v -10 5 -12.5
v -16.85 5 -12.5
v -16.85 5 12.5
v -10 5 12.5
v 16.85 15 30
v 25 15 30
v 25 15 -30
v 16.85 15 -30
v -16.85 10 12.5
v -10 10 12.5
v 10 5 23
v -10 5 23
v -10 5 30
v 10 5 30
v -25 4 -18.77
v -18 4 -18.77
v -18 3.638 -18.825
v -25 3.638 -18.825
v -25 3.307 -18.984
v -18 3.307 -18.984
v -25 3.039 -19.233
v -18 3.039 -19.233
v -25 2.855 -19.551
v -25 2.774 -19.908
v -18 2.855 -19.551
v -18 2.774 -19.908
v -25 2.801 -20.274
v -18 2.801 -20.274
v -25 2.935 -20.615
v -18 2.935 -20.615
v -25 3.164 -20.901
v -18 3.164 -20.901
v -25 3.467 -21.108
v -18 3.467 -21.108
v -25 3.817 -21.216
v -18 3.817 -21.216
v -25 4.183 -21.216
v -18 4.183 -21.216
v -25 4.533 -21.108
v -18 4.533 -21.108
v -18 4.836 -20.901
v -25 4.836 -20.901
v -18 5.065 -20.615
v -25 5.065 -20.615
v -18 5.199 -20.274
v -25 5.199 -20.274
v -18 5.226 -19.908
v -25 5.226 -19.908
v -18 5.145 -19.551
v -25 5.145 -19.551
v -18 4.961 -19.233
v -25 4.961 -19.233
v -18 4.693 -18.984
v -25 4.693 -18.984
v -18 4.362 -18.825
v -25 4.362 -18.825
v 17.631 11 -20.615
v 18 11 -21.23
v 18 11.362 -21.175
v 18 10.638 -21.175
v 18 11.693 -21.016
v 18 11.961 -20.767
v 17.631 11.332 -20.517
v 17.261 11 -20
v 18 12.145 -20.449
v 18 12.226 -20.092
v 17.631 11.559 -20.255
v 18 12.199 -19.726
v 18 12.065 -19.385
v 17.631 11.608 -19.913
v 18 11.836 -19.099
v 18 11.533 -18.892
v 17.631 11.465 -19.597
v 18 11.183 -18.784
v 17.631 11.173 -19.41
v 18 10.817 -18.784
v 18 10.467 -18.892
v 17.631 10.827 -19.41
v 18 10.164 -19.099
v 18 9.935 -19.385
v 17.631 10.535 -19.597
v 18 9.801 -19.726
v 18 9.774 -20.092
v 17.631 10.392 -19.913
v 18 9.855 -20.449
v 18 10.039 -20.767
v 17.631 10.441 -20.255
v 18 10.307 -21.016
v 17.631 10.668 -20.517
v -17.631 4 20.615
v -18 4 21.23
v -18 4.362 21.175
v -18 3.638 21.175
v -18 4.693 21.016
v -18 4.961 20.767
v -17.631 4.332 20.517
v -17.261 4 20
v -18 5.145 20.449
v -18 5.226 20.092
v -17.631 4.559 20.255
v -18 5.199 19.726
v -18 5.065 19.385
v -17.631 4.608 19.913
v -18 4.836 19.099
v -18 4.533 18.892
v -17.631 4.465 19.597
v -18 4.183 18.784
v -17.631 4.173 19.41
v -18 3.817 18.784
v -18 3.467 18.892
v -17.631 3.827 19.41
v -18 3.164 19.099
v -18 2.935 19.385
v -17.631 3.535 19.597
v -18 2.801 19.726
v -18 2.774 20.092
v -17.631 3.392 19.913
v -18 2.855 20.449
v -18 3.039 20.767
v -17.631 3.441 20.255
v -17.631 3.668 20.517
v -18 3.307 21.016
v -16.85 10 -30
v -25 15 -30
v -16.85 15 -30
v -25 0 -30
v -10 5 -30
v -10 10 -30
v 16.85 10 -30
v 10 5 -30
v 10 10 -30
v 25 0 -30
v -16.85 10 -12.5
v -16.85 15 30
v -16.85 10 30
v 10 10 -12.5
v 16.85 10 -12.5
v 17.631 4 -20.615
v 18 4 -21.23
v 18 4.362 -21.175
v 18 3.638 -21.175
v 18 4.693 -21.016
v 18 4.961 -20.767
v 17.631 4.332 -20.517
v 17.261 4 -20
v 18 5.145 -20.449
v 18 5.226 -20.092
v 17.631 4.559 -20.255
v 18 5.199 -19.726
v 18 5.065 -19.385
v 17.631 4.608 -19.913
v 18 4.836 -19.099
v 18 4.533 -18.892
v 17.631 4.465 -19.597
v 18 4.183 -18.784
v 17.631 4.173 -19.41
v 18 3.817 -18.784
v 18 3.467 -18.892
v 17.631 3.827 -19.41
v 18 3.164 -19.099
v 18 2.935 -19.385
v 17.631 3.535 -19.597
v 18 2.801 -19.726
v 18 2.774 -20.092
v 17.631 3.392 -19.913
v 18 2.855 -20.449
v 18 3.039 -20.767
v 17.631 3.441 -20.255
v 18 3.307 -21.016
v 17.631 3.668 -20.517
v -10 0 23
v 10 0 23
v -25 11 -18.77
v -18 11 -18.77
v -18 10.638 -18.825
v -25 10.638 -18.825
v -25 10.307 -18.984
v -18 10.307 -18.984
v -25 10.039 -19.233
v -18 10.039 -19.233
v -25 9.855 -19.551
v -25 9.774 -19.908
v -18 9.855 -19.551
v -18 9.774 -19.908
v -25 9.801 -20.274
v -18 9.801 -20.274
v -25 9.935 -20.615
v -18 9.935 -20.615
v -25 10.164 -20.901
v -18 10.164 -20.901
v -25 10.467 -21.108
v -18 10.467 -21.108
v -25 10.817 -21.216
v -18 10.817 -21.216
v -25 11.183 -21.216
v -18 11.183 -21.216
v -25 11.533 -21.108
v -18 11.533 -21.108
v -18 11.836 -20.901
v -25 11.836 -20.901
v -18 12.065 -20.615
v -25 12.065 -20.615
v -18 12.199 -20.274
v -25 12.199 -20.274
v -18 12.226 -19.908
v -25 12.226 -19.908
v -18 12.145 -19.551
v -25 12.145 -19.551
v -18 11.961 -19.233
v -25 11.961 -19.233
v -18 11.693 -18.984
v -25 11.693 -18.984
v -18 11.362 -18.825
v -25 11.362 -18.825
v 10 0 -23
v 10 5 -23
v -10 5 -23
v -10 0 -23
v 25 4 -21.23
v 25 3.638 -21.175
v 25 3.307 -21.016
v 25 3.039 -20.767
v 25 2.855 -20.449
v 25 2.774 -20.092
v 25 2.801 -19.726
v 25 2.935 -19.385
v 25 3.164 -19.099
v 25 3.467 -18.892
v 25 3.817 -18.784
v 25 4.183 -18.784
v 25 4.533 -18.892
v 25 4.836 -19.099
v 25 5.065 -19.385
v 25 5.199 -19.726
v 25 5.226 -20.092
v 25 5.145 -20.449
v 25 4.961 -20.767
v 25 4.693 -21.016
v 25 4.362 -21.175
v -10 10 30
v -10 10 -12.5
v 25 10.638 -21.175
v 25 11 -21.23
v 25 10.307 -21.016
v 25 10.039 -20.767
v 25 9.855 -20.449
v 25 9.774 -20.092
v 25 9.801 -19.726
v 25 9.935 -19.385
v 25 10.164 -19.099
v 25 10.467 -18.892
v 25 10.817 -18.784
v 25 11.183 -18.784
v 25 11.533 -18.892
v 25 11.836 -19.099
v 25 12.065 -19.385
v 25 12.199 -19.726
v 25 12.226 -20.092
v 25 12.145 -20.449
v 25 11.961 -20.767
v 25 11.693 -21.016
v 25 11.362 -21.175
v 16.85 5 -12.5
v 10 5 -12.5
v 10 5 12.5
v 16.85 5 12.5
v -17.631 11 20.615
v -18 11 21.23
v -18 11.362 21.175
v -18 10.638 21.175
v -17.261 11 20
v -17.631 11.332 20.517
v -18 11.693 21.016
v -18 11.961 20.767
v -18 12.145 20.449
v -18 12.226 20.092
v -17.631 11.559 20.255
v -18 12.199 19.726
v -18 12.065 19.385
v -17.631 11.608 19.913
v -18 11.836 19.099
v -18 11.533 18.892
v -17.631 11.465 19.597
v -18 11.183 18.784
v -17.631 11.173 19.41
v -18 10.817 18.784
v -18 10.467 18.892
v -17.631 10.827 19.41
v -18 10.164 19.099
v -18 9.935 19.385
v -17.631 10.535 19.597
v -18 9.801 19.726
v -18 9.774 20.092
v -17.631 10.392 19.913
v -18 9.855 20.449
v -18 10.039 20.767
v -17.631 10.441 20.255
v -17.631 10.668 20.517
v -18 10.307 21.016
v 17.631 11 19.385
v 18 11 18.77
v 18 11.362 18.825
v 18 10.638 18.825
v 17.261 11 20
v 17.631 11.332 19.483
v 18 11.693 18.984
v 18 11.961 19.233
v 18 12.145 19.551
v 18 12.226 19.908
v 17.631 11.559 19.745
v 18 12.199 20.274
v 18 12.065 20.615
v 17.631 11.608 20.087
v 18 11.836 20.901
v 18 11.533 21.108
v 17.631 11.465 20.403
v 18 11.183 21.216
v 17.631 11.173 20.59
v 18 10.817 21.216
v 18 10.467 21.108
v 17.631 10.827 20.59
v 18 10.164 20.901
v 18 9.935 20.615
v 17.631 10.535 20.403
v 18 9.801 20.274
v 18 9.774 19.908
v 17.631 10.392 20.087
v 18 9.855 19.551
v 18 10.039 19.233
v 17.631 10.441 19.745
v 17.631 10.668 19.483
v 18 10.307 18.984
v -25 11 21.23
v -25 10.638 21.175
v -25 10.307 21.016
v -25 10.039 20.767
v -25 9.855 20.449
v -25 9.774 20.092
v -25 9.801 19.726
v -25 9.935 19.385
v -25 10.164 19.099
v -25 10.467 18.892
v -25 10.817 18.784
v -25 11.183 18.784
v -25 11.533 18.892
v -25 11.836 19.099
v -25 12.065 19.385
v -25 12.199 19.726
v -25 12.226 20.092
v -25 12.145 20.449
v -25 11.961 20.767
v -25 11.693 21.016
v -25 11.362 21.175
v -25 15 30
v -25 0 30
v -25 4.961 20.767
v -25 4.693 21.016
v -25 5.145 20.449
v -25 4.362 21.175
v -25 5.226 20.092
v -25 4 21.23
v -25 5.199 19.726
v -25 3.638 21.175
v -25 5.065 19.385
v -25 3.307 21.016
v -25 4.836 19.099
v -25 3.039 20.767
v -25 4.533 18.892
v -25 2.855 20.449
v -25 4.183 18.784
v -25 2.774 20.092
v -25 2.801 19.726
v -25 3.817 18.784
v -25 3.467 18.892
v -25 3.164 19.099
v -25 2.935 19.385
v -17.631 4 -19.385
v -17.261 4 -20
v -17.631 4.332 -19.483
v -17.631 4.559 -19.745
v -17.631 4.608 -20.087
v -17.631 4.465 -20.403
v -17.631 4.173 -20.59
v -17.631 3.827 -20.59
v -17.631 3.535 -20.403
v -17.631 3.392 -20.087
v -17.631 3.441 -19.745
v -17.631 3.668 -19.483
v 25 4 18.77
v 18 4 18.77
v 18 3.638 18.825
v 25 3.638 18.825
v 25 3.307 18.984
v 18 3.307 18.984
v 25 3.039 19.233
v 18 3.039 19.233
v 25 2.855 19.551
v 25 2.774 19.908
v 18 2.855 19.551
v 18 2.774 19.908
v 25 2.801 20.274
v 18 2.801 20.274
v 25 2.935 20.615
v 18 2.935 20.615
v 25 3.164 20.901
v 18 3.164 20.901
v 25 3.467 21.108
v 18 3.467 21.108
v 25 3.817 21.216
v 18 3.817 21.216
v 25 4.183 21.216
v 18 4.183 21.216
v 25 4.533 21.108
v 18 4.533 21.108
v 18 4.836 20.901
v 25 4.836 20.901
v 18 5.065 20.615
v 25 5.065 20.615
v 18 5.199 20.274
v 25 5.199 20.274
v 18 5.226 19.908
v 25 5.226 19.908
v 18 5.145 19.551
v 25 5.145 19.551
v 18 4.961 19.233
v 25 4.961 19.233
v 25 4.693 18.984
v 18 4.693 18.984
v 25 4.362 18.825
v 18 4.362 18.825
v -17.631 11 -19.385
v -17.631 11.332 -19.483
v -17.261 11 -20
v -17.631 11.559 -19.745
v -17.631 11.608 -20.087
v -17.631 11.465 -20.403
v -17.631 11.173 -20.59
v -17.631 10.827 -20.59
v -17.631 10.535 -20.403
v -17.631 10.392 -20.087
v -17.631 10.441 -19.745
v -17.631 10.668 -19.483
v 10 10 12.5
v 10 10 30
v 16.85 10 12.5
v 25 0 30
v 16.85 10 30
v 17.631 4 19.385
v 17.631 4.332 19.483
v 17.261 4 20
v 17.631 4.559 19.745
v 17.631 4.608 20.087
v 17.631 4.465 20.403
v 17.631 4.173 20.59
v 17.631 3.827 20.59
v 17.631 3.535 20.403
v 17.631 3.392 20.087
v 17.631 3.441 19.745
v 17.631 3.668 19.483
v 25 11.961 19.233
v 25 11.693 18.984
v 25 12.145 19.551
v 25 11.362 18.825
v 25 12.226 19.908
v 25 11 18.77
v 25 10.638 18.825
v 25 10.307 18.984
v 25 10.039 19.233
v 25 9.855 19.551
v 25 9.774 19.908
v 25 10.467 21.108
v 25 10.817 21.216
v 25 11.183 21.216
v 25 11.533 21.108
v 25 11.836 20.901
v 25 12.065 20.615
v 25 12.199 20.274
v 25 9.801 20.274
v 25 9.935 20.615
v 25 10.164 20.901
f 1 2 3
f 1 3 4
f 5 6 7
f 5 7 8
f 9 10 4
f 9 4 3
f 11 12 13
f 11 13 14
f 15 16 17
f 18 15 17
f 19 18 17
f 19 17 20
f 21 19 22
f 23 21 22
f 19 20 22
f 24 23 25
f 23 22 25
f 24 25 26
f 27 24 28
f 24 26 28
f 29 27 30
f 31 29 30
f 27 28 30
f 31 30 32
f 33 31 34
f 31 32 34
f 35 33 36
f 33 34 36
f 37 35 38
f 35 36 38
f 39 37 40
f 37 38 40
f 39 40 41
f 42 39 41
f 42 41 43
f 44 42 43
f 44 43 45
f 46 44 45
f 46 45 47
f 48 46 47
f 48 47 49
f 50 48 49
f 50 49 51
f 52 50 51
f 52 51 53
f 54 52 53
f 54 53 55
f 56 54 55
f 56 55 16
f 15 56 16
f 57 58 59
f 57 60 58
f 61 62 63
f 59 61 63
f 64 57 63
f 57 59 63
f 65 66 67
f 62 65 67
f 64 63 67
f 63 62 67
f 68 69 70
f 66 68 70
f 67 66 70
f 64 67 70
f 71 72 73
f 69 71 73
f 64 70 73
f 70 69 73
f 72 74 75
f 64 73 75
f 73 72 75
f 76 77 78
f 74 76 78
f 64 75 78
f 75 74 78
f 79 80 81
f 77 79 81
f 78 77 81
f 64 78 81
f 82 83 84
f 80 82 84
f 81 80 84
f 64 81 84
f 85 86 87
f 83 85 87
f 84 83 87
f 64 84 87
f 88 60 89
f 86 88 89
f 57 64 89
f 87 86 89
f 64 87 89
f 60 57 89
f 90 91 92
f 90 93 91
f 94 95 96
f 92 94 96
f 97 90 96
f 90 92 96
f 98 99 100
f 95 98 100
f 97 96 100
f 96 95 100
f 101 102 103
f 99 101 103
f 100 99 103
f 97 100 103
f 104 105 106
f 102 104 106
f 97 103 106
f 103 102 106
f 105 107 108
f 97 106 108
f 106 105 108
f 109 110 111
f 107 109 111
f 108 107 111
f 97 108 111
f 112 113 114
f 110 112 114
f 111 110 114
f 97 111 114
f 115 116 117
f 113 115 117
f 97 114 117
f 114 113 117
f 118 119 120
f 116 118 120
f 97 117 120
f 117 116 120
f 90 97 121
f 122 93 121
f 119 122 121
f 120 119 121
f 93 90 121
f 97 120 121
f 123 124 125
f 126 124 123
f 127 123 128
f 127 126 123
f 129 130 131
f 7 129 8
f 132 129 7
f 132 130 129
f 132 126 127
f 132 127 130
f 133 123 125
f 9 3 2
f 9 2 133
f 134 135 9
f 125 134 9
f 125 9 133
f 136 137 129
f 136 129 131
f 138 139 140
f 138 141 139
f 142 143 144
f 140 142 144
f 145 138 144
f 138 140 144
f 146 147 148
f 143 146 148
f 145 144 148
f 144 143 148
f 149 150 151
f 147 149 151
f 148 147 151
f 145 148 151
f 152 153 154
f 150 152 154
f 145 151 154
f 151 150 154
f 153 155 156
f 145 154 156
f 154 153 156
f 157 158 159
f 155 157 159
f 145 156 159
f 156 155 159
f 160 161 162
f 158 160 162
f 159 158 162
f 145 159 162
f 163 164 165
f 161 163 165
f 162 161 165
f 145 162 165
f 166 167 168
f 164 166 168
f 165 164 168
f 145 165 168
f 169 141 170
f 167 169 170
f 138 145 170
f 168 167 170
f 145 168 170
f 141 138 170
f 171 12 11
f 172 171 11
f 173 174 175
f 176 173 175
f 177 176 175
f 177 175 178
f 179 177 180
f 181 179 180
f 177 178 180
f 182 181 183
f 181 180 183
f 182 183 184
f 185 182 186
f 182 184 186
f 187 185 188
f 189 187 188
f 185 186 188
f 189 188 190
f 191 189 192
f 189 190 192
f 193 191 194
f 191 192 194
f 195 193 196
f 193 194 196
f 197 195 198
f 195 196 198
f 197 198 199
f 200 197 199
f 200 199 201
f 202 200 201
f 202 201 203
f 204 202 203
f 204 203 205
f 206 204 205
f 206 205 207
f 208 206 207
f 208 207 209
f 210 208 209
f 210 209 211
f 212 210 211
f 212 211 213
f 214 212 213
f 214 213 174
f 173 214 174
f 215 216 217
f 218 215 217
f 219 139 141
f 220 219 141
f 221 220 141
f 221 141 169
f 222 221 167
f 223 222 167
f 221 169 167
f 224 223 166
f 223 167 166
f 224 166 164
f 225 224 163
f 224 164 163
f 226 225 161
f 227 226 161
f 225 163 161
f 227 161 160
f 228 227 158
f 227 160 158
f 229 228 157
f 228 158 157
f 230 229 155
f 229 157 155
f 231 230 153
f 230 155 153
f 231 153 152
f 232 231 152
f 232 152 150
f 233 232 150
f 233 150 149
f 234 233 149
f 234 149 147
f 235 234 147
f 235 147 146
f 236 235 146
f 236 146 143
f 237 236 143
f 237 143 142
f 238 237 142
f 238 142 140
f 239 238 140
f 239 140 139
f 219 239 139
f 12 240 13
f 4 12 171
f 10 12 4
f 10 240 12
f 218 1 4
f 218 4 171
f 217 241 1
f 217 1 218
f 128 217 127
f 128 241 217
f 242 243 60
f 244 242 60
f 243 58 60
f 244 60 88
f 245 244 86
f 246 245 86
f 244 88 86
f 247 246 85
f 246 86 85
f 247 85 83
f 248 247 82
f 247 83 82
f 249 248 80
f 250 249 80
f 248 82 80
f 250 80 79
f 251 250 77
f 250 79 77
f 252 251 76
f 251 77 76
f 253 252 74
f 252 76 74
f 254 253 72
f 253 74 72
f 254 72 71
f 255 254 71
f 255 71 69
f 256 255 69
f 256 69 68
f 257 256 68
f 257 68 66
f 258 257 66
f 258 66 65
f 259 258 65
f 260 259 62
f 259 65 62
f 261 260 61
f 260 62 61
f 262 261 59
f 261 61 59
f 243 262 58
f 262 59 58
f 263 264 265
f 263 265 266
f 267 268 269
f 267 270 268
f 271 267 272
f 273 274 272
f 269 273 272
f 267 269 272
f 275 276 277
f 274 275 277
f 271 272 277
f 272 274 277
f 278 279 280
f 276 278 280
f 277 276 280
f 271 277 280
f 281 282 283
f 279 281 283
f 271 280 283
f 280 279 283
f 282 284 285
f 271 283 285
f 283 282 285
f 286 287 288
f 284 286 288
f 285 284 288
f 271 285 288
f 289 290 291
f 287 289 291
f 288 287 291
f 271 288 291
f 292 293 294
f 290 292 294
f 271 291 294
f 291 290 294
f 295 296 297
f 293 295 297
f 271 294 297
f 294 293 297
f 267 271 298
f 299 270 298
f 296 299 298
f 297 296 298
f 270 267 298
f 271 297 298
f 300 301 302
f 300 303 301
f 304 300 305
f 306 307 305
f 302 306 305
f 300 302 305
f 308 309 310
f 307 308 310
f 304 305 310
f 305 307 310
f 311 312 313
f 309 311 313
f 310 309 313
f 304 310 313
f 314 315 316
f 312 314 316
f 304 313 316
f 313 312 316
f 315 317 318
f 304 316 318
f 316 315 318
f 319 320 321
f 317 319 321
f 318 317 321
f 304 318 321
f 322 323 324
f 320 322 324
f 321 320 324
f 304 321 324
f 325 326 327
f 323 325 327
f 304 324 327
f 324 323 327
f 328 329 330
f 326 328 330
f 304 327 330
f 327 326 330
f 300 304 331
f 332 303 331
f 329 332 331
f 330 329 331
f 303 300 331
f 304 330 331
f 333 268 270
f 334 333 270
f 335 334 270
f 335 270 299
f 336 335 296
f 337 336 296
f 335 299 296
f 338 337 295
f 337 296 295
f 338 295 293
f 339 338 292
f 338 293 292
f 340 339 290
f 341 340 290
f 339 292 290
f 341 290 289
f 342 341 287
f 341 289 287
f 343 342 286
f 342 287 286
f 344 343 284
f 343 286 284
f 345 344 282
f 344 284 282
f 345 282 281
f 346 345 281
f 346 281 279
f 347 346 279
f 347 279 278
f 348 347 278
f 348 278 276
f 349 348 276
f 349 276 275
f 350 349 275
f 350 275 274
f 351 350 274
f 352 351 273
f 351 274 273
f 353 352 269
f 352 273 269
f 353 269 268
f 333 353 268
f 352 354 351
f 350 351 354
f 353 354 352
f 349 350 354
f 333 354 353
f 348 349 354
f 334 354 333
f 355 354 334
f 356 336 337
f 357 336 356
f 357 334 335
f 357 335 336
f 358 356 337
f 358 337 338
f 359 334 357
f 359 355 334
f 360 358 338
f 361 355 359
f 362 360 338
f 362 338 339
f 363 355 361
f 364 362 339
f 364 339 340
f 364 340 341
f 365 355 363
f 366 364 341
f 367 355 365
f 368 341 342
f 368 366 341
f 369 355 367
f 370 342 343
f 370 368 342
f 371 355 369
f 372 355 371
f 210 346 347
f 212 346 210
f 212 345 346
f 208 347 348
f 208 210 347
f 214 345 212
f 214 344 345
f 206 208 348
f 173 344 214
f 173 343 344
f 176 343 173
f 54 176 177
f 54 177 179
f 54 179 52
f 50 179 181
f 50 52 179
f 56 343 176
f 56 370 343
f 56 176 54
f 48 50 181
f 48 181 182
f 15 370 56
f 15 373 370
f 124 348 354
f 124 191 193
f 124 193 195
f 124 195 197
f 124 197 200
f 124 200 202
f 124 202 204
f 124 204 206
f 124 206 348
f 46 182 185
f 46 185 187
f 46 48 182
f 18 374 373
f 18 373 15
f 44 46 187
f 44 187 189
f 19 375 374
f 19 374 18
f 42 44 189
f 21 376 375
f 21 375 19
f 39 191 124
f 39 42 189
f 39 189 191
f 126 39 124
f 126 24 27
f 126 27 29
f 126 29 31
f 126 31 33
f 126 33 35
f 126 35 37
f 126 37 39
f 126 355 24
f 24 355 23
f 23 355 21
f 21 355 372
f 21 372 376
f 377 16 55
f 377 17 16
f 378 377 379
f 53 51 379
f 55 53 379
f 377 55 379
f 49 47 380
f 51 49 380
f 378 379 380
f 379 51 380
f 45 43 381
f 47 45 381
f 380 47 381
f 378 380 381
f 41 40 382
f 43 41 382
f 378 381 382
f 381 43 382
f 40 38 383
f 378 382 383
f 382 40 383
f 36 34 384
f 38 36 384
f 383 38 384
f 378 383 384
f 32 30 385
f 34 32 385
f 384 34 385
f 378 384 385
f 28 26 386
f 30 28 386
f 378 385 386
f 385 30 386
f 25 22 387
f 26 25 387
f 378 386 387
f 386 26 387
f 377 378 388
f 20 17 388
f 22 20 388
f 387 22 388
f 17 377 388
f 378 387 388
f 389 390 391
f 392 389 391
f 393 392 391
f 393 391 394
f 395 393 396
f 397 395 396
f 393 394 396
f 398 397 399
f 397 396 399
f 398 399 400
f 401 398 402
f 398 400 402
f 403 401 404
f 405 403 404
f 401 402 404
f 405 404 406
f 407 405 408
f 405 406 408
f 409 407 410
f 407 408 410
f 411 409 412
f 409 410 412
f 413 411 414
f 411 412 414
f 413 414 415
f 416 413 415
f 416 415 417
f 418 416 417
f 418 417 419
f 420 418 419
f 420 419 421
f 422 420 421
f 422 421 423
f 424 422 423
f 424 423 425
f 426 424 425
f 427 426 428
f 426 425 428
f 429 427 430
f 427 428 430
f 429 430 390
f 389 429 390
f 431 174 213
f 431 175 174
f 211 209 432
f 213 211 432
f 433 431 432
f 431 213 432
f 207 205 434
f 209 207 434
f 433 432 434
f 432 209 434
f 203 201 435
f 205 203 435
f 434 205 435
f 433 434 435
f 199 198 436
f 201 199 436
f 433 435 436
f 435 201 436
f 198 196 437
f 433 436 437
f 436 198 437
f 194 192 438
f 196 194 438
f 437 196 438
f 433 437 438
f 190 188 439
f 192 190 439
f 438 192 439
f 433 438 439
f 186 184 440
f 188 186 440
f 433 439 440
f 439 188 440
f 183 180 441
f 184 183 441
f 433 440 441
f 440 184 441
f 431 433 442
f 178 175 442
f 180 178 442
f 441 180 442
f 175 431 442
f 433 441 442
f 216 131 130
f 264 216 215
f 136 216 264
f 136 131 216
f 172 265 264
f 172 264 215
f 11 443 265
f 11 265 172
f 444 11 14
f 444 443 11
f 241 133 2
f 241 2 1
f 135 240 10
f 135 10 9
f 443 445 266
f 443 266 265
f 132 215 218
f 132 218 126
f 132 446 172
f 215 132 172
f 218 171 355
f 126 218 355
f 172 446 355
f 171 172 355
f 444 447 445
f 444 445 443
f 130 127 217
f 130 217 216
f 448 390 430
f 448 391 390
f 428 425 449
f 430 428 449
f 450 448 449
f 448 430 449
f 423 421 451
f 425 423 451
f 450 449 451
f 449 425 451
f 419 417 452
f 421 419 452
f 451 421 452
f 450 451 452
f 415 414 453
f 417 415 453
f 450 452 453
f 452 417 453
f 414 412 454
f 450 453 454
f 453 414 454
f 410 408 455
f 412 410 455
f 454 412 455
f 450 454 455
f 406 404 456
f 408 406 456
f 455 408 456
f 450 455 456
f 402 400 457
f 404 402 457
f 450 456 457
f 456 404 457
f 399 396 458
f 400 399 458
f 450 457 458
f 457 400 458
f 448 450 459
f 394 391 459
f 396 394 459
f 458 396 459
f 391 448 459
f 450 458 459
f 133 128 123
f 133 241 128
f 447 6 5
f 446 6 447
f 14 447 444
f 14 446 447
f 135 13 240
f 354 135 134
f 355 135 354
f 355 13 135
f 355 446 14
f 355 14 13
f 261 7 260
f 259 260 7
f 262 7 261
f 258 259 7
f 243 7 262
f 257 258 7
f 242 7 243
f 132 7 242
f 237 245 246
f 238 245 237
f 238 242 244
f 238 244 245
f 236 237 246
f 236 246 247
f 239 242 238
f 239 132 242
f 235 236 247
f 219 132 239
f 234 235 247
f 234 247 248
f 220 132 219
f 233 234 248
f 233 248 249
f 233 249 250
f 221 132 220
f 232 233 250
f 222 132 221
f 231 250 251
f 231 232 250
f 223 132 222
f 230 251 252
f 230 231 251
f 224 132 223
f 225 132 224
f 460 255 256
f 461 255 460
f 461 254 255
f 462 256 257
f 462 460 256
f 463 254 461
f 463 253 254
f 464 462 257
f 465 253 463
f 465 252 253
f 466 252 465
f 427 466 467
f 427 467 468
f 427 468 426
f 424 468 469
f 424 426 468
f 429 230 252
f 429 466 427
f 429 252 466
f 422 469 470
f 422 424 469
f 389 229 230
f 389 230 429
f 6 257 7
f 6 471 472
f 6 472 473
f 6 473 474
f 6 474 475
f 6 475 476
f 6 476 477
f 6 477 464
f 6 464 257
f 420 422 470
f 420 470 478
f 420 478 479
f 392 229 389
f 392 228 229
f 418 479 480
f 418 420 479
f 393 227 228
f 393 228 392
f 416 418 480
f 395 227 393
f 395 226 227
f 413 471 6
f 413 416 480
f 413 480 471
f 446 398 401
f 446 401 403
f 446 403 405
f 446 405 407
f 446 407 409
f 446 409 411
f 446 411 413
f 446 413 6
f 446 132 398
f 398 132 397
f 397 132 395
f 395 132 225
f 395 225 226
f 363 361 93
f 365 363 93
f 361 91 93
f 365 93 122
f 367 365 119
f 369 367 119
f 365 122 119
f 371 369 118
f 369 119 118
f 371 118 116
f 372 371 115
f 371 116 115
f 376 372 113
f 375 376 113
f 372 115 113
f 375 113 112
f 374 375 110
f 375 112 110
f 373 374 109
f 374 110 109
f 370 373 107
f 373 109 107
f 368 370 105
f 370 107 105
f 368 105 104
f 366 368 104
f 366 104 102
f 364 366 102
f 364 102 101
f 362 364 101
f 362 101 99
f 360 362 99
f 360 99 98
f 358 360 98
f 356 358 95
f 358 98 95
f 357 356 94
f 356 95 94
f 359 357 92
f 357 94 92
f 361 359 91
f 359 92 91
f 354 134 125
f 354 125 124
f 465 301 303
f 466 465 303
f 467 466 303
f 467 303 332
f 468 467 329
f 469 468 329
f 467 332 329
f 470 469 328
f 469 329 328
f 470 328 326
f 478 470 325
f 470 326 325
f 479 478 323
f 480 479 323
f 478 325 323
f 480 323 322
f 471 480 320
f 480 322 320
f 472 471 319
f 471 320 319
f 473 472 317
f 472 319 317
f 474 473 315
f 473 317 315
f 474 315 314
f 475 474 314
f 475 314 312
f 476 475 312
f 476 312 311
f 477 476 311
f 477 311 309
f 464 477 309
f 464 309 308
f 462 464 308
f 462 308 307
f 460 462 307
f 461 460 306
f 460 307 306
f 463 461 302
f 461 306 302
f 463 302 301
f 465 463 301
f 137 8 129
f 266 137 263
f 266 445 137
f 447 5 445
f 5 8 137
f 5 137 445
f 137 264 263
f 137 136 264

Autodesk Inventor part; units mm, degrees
ref_plane "YZ Plane" through (0, 0, 0) normal (1, 0, 0) x (0, 1, 0)
ref_plane "XZ Plane" through (0, 0, 0) normal (0, 1, 0) x (-1, 0, 0)
ref_plane "XY Plane" through (0, 0, 0) normal (0, 0, 1) x (1, 0, 0)
sketch "Sketch1" plane through (0, 0, 0) normal (0, 1, 0) x (-1, 0, 0)
  line L0 (25, -30) -> (-25, -30)
  line L1 (-25, -30) -> (-25, 30)
  line L2 (-25, 30) -> (25, 30)
  line L3 (25, 30) -> (25, -30)
  point P0 (0, 0)
  dimension "d0" = 50
  dimension "d1" = 60
  dimension "d8" = 30
  dimension "d9" = 25
extrude "Extrusion1" add sketch "Sketch1" along normal blind 15
sketch "Sketch2" plane through (0, 15, 0) normal (0, 1, 0) x (1, 0, 0)
  line L0 (-16.85, 12.5) -> (16.85, 12.5)
  line L1 (16.85, 12.5) -> (16.85, -12.5)
  line L2 (16.85, -12.5) -> (-16.85, -12.5)
  line L3 (-16.85, -12.5) -> (-16.85, 12.5)
  point P0 (0, 0)
  dimension "d4" = 33.7
  dimension "d5" = 25
  dimension "d6" = 12.5
  dimension "d7" = 16.85
extrude "Extrusion2" cut sketch "Sketch2" against normal blind 10
sketch "Sketch3" plane through (0, 15, 0) normal (0, 1, 0) x (1, 0, 0)
  line L0 (-25, 30) -> (25, 30) projected
  line L1 (-25, -30) -> (25, -30) projected
  line L2 (-10, 30) -> (10, 30)
  line L3 (10, 30) -> (10, -30)
  line L4 (10, -30) -> (-10, -30)
  line L5 (-10, -30) -> (-10, 30)
  point P0 (0, 0)
  dimension "d12" = 20
  dimension "d13" = 10
extrude "Extrusion3" cut sketch "Sketch3" against normal up to surface (10 mm away)
sketch "Sketch4" plane through (0, 5, 0) normal (0, 1, 0) x (1, 0, 0)
  line L0 (-16.85, 12.5) -> (-10, 12.5) projected
  line L1 (16.85, -12.5) -> (10, -12.5) projected
  line L2 (10, 12.5) -> (10, 30) projected
  line L3 (-10, -30) -> (-10, -12.5) projected
  line L4 (10, 23) -> (-10, 23)
  line L5 (-10, 23) -> (-10, -23)
  line L6 (-10, -23) -> (10, -23)
  line L7 (10, -23) -> (10, 23)
  line L8 (-10, 30) -> (10, 30) projected
  line L9 (10, -30) -> (-10, -30) projected
  dimension "d18" = 7
  dimension "d19" = 7
extrude "Extrusion4" cut sketch "Sketch4" against normal up to next
sketch "Sketch6" plane through (-25, 0, -30) normal (-1, 0, 0) x (0, 0, 1)
  line L0 (0, 0) -> (0, 15) projected
  line L1 (60, 0) -> (60, 15) projected
  line L2 (60, 0) -> (0, 0) projected
  point P0 (30, 0)
  point P1 (10, 4)
  point P2 (50, 4)
  point P3 (50, 11)
  point P4 (10, 11)
  dimension "d24" = 7
  dimension "d25" = 7
  dimension "d26" = 10
  dimension "d27" = 10
  dimension "d28" = 10
  dimension "d29" = 10
  dimension "d30" = 4
  dimension "d31" = 4
hole "Hole1" at (-25, 4, -20) at (-25, 4, 20) at (-25, 11, 20) at (-25, 11, -20) direction (1, 0, 0) diameter 2.459 depth 7 tip angle 118 thread size "M3x0.5" class "6H" standard "ANSI Metric M Profile"
sketch "Sketch7" plane through (25, 0, 30) normal (1, 0, 0) x (0, 0, -1)
  circle A0 centre (10, 4) radius 1.2295 projected
  circle A1 centre (10, 11) radius 1.2295 projected
  circle A2 centre (50, 11) radius 1.2295 projected
  circle A3 centre (50, 4) radius 1.2295 projected
  point P0 (30, 0)
hole "Hole2" at (25, 4, 20) at (25, 11, 20) at (25, 11, -20) at (25, 4, -20) direction (-1, 0, 0) diameter 2.459 depth 7 tip angle 118 thread size "M3x0.5" class "6H" standard "ANSI Metric M Profile"
sketch "Sketch8" plane through (-25, 0, 30) normal (0, 0, 1) x (1, 0, 0)
  line L0 (0, 15) -> (15, 15) projected
  line L1 (8.15, 15) -> (41.85, 15)
  line L2 (41.85, 15) -> (41.85, 10)
  line L3 (41.85, 10) -> (8.15, 10)
  line L4 (8.15, 10) -> (8.15, 15)
  line L5 (41.85, 15) -> (41.85, 5) projected
  line L6 (8.15, 15) -> (8.15, 5) projected
  point P0 (25, 0)
  dimension "d49" = 5
  dimension "d50" = 0
  dimension "d51" = 0
  dimension "d52" = 0
extrude "Extrusion6" cut sketch "Sketch8" against normal through all
properties part number "Spring support"
